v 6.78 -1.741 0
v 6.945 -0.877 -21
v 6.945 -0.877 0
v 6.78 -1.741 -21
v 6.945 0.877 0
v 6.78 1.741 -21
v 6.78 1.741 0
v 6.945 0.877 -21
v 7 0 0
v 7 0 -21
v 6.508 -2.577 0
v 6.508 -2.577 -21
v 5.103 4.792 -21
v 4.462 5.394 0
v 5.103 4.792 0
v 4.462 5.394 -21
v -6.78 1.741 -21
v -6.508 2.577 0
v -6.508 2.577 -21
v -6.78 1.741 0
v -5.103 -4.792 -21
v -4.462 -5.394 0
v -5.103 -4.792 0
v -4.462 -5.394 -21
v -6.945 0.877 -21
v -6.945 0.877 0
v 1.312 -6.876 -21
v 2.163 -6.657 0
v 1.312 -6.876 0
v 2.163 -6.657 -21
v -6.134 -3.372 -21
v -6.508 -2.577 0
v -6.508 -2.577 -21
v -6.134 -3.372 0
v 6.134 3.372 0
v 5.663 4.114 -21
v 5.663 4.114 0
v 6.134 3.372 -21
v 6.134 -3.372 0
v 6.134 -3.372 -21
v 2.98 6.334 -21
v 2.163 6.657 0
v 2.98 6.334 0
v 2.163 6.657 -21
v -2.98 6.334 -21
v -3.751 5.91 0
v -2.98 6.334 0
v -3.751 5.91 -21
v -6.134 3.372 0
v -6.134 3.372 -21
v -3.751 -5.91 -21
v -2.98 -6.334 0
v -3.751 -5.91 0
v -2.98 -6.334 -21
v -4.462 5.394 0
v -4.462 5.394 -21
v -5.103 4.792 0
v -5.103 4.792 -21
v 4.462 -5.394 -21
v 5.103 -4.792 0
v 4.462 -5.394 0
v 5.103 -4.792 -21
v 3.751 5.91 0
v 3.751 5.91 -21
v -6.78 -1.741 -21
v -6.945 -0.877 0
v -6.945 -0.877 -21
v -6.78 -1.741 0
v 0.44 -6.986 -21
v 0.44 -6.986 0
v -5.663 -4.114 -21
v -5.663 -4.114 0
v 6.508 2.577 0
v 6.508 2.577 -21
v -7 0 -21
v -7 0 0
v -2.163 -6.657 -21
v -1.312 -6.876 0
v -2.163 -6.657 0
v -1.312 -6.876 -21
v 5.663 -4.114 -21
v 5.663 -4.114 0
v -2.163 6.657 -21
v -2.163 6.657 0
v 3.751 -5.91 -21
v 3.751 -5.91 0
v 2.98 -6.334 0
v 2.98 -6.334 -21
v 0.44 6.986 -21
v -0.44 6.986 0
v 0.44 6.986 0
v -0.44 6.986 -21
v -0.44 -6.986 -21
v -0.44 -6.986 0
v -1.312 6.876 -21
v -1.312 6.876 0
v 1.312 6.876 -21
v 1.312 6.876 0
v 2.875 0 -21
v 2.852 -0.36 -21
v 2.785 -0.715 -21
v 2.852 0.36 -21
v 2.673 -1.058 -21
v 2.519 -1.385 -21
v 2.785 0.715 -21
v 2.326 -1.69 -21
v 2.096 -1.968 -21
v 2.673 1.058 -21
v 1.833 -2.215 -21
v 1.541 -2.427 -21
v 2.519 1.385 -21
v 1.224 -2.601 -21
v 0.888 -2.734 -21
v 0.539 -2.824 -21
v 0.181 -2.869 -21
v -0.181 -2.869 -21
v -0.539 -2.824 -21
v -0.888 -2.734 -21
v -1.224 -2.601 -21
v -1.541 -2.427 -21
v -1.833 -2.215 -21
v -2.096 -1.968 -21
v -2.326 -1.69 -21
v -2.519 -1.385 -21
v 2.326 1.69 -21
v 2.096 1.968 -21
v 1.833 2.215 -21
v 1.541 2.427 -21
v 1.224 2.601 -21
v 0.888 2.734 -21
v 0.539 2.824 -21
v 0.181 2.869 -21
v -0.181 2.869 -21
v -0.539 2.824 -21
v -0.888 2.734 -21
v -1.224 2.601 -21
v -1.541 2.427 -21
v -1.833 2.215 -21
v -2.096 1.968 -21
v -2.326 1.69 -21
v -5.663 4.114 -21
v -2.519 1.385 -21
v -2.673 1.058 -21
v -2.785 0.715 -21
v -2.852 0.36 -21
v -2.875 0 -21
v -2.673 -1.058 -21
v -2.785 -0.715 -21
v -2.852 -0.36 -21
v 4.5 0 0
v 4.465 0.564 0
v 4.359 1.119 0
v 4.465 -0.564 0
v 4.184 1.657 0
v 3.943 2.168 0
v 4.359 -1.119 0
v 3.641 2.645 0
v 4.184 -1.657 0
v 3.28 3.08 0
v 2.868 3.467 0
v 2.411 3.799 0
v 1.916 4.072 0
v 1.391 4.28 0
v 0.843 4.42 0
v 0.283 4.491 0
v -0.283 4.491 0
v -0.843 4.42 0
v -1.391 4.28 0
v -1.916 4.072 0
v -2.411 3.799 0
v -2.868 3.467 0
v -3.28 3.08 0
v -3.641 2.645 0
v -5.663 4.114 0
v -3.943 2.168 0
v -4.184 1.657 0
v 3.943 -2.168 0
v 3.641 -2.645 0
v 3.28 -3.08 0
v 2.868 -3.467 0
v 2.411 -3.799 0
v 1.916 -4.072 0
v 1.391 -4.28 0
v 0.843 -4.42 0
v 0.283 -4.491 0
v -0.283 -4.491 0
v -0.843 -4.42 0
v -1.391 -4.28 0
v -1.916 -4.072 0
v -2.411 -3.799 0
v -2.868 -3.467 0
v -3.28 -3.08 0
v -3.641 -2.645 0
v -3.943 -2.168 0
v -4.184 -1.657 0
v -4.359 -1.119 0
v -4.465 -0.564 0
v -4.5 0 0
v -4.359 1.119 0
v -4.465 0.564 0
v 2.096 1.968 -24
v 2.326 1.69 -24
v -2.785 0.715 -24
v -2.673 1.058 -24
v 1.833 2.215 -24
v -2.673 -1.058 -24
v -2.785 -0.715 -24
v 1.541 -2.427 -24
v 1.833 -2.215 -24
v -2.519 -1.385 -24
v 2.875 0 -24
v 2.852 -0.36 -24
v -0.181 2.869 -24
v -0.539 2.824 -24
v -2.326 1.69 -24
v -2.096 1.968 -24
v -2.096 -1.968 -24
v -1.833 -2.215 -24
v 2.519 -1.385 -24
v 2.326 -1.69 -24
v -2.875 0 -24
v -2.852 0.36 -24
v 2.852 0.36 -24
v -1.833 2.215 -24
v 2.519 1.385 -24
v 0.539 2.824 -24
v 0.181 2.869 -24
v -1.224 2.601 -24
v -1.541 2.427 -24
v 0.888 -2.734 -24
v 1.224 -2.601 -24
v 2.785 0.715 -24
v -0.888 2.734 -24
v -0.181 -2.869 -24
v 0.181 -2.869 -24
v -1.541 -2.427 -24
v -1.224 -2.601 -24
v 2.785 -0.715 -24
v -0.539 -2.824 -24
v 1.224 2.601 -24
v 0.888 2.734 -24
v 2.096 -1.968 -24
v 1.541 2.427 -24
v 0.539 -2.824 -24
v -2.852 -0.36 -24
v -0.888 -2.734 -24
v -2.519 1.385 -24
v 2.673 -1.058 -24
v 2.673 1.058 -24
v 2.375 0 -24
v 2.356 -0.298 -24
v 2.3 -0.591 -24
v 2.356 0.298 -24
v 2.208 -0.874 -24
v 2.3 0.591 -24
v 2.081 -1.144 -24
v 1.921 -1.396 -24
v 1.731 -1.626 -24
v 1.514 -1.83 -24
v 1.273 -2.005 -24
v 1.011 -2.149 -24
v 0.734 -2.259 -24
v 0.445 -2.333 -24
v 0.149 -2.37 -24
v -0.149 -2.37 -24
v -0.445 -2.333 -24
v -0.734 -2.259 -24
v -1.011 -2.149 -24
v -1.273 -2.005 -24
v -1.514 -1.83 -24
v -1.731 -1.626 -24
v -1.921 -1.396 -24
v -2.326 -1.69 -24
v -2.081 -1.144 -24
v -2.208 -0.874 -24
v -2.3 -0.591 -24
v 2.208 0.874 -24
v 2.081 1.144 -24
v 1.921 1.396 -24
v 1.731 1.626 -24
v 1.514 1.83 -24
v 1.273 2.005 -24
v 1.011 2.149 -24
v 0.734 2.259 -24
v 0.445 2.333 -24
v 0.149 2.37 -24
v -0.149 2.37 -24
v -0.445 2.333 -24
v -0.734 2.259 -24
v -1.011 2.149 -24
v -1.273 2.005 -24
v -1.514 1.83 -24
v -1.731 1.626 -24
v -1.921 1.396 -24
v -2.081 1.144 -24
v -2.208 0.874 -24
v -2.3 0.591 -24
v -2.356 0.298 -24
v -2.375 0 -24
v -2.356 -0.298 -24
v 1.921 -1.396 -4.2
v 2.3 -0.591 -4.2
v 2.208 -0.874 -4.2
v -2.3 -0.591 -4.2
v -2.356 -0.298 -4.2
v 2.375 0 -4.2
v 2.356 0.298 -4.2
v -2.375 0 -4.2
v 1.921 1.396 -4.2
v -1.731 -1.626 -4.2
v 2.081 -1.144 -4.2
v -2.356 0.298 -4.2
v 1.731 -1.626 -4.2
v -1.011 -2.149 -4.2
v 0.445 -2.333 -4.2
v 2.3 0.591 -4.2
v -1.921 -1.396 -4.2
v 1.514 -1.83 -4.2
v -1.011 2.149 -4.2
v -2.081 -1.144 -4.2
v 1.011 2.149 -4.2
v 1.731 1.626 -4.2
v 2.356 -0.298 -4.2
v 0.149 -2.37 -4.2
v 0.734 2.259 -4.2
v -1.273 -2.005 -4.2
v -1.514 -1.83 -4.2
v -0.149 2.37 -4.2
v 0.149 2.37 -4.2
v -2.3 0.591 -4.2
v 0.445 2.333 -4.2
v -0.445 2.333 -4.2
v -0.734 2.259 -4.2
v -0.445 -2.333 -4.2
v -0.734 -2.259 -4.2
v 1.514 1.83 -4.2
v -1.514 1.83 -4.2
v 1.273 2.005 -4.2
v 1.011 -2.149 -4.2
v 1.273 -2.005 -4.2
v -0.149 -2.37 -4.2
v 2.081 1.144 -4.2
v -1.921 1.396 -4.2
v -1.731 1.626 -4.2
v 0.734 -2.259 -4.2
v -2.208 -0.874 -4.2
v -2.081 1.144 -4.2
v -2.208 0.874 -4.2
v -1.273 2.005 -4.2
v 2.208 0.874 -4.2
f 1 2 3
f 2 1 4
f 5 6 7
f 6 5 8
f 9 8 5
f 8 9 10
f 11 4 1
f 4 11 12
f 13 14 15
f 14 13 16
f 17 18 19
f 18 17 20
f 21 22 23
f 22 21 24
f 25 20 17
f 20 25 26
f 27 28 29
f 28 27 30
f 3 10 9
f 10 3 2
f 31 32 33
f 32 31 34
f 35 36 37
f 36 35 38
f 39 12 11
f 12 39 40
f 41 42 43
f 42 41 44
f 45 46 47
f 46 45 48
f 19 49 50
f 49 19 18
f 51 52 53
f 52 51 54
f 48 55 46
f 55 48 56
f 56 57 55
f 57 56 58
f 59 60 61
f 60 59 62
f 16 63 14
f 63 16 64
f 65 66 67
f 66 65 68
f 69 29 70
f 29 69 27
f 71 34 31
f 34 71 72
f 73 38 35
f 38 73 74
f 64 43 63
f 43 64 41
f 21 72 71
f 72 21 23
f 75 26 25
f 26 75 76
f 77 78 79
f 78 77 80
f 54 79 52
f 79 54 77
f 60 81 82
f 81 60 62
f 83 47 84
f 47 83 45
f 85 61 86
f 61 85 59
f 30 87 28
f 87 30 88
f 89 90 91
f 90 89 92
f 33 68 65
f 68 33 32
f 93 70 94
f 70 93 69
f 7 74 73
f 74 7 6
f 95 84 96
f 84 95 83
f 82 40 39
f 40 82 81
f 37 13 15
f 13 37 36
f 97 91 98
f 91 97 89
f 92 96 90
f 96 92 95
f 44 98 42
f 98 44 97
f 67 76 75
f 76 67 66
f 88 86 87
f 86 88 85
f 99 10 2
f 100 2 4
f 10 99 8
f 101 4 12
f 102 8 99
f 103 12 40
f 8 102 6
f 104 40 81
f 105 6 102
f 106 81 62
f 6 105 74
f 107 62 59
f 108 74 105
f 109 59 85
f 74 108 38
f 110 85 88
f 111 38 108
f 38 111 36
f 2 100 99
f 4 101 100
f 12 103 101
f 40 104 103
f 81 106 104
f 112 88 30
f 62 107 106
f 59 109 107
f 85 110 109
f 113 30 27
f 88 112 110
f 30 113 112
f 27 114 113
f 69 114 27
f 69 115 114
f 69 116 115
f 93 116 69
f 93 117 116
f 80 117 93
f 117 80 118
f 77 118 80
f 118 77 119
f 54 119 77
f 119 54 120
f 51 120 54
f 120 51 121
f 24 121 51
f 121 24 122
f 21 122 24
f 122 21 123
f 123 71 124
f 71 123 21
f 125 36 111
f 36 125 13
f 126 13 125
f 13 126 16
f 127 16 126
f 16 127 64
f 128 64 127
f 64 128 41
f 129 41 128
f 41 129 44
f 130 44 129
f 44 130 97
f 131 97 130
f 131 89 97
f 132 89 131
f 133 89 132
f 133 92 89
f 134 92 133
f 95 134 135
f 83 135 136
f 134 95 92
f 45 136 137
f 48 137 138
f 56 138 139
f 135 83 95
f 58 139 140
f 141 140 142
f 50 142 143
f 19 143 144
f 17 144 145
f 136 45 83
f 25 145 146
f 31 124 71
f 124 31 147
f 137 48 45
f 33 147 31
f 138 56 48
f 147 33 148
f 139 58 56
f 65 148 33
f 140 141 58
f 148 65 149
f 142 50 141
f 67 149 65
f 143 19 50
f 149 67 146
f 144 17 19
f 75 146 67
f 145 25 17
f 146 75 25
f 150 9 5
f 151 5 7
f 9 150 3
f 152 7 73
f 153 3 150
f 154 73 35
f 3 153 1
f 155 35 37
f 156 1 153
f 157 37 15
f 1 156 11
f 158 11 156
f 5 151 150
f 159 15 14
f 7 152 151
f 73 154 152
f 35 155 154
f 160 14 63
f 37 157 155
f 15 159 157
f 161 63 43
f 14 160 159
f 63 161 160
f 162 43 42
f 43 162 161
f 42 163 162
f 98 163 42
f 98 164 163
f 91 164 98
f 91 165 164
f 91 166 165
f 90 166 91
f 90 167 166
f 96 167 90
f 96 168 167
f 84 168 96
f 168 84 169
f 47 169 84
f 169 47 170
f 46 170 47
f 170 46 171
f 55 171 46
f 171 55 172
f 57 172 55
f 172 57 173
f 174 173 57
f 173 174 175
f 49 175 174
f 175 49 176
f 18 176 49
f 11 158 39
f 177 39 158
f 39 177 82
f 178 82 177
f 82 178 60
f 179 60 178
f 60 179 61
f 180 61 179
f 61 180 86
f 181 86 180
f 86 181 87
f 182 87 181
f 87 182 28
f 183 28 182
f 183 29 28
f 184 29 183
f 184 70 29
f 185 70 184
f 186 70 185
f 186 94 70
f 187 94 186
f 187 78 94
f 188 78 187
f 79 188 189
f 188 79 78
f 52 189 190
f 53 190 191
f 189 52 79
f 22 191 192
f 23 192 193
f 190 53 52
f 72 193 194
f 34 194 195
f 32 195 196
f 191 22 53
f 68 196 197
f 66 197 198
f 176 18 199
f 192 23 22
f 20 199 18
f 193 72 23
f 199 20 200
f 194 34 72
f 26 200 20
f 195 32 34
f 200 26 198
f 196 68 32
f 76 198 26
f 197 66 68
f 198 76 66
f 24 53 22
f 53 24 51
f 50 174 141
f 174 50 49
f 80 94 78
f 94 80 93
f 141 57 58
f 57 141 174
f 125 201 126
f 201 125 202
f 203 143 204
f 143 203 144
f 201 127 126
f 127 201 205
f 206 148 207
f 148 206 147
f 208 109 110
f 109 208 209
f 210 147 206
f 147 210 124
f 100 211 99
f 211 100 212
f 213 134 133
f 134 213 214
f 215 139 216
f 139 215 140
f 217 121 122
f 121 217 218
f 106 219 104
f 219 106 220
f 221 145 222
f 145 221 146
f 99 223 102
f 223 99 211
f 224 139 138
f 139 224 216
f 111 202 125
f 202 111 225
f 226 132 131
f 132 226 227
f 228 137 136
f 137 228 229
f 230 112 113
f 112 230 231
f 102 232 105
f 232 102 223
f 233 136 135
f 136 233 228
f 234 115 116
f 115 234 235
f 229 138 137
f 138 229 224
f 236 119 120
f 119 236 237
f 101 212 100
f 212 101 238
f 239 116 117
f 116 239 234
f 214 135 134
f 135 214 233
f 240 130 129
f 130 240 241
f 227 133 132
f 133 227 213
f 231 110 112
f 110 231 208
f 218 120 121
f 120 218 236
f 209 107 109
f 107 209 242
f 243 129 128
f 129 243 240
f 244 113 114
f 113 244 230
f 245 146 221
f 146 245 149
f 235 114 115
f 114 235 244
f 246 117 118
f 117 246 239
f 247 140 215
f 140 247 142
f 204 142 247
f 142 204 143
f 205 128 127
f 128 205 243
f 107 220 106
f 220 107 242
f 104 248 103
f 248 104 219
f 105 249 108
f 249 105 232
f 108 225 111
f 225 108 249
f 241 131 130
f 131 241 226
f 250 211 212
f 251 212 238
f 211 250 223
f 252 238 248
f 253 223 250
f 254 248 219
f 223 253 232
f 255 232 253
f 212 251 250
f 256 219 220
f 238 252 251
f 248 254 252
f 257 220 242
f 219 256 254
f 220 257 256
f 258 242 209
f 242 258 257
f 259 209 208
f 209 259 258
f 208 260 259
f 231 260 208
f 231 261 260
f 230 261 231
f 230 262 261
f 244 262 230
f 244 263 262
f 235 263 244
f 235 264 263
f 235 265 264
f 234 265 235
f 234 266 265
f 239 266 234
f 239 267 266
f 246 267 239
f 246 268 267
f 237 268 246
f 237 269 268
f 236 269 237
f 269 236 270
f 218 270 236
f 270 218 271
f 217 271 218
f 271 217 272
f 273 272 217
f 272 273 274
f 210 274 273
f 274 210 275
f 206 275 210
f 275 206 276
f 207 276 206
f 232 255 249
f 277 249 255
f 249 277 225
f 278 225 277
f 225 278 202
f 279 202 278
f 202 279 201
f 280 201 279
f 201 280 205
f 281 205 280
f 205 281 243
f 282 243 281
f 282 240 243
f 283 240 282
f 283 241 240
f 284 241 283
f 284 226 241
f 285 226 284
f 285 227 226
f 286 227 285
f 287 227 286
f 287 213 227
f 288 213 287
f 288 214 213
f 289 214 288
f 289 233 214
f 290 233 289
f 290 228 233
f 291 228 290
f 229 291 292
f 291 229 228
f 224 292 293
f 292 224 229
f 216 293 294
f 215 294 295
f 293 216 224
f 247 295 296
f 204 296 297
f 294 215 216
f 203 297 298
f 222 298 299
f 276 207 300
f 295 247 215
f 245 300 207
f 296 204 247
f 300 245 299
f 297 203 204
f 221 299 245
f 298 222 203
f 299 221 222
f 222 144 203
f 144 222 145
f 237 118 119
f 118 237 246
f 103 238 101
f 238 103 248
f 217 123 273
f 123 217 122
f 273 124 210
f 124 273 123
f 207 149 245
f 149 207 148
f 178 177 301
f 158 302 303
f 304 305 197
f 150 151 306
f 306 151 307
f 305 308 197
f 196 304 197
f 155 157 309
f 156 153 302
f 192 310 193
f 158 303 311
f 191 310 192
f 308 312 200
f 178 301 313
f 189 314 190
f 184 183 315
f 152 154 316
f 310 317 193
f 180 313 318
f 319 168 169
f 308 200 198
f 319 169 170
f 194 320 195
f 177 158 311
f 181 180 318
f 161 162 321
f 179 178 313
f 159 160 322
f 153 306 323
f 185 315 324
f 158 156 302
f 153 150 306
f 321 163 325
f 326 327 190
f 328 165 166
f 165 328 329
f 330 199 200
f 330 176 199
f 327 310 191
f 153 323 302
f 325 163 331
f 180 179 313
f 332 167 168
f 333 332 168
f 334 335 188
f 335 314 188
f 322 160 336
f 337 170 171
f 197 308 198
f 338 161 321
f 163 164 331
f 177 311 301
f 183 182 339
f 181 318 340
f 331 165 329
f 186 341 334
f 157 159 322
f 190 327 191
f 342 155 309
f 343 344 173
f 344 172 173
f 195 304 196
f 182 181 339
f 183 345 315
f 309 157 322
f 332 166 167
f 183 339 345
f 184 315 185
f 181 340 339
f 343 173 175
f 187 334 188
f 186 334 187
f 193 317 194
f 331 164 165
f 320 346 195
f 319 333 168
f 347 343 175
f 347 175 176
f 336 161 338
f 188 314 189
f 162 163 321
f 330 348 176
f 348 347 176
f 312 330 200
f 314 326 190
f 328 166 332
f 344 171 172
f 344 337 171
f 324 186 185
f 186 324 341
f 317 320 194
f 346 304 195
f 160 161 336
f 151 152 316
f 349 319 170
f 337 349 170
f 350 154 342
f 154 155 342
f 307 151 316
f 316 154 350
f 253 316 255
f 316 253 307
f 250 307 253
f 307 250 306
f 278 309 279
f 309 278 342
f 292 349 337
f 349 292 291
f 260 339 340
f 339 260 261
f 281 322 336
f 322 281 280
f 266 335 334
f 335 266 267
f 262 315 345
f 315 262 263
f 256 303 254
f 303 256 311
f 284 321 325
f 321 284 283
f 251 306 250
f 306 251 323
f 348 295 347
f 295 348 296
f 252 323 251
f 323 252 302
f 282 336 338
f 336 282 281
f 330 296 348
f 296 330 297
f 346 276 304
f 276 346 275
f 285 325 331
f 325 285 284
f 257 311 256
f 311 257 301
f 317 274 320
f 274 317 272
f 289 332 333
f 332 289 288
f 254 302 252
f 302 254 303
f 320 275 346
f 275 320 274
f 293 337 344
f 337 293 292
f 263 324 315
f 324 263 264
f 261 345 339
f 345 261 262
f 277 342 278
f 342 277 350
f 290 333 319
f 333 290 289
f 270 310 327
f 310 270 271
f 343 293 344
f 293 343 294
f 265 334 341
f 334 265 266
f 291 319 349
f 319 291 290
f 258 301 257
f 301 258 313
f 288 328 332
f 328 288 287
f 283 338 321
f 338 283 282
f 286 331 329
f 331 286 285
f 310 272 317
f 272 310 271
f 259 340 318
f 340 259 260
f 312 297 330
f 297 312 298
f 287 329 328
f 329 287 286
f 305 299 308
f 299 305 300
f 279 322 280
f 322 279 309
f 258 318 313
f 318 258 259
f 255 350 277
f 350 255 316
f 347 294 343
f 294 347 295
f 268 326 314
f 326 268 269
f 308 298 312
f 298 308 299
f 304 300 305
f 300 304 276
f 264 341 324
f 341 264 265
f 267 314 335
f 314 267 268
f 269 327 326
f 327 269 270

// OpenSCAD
$fn = 50;

difference() {
	union() {
		translate(v = [0, 0, -21.0]) {
			cylinder(h = 21, r = 7.0);
		}
		#translate(v = [0, 0, -24.0]) {
			cylinder(h = 24, r = 2.875);
		}
	}
	union() {
		translate(v = [0, 0, 0]) {
			rotate(a = [0, 0, 0]) {
				difference() {
					union() {
						translate(v = [0, 0, -24.0]) {
							cylinder(h = 24, r = 2.25);
						}
						translate(v = [0, 0, -4.2]) {
							cylinder(h = 4.2, r1 = 2.375, r2 = 4.5);
						}
						translate(v = [0, 0, -24.0]) {
							cylinder(h = 24, r = 2.375);
						}
						translate(v = [0, 0, -24.0]) {
							cylinder(h = 24, r = 2.25);
						}
					}
					union();
				}
			}
		}
	}
}
